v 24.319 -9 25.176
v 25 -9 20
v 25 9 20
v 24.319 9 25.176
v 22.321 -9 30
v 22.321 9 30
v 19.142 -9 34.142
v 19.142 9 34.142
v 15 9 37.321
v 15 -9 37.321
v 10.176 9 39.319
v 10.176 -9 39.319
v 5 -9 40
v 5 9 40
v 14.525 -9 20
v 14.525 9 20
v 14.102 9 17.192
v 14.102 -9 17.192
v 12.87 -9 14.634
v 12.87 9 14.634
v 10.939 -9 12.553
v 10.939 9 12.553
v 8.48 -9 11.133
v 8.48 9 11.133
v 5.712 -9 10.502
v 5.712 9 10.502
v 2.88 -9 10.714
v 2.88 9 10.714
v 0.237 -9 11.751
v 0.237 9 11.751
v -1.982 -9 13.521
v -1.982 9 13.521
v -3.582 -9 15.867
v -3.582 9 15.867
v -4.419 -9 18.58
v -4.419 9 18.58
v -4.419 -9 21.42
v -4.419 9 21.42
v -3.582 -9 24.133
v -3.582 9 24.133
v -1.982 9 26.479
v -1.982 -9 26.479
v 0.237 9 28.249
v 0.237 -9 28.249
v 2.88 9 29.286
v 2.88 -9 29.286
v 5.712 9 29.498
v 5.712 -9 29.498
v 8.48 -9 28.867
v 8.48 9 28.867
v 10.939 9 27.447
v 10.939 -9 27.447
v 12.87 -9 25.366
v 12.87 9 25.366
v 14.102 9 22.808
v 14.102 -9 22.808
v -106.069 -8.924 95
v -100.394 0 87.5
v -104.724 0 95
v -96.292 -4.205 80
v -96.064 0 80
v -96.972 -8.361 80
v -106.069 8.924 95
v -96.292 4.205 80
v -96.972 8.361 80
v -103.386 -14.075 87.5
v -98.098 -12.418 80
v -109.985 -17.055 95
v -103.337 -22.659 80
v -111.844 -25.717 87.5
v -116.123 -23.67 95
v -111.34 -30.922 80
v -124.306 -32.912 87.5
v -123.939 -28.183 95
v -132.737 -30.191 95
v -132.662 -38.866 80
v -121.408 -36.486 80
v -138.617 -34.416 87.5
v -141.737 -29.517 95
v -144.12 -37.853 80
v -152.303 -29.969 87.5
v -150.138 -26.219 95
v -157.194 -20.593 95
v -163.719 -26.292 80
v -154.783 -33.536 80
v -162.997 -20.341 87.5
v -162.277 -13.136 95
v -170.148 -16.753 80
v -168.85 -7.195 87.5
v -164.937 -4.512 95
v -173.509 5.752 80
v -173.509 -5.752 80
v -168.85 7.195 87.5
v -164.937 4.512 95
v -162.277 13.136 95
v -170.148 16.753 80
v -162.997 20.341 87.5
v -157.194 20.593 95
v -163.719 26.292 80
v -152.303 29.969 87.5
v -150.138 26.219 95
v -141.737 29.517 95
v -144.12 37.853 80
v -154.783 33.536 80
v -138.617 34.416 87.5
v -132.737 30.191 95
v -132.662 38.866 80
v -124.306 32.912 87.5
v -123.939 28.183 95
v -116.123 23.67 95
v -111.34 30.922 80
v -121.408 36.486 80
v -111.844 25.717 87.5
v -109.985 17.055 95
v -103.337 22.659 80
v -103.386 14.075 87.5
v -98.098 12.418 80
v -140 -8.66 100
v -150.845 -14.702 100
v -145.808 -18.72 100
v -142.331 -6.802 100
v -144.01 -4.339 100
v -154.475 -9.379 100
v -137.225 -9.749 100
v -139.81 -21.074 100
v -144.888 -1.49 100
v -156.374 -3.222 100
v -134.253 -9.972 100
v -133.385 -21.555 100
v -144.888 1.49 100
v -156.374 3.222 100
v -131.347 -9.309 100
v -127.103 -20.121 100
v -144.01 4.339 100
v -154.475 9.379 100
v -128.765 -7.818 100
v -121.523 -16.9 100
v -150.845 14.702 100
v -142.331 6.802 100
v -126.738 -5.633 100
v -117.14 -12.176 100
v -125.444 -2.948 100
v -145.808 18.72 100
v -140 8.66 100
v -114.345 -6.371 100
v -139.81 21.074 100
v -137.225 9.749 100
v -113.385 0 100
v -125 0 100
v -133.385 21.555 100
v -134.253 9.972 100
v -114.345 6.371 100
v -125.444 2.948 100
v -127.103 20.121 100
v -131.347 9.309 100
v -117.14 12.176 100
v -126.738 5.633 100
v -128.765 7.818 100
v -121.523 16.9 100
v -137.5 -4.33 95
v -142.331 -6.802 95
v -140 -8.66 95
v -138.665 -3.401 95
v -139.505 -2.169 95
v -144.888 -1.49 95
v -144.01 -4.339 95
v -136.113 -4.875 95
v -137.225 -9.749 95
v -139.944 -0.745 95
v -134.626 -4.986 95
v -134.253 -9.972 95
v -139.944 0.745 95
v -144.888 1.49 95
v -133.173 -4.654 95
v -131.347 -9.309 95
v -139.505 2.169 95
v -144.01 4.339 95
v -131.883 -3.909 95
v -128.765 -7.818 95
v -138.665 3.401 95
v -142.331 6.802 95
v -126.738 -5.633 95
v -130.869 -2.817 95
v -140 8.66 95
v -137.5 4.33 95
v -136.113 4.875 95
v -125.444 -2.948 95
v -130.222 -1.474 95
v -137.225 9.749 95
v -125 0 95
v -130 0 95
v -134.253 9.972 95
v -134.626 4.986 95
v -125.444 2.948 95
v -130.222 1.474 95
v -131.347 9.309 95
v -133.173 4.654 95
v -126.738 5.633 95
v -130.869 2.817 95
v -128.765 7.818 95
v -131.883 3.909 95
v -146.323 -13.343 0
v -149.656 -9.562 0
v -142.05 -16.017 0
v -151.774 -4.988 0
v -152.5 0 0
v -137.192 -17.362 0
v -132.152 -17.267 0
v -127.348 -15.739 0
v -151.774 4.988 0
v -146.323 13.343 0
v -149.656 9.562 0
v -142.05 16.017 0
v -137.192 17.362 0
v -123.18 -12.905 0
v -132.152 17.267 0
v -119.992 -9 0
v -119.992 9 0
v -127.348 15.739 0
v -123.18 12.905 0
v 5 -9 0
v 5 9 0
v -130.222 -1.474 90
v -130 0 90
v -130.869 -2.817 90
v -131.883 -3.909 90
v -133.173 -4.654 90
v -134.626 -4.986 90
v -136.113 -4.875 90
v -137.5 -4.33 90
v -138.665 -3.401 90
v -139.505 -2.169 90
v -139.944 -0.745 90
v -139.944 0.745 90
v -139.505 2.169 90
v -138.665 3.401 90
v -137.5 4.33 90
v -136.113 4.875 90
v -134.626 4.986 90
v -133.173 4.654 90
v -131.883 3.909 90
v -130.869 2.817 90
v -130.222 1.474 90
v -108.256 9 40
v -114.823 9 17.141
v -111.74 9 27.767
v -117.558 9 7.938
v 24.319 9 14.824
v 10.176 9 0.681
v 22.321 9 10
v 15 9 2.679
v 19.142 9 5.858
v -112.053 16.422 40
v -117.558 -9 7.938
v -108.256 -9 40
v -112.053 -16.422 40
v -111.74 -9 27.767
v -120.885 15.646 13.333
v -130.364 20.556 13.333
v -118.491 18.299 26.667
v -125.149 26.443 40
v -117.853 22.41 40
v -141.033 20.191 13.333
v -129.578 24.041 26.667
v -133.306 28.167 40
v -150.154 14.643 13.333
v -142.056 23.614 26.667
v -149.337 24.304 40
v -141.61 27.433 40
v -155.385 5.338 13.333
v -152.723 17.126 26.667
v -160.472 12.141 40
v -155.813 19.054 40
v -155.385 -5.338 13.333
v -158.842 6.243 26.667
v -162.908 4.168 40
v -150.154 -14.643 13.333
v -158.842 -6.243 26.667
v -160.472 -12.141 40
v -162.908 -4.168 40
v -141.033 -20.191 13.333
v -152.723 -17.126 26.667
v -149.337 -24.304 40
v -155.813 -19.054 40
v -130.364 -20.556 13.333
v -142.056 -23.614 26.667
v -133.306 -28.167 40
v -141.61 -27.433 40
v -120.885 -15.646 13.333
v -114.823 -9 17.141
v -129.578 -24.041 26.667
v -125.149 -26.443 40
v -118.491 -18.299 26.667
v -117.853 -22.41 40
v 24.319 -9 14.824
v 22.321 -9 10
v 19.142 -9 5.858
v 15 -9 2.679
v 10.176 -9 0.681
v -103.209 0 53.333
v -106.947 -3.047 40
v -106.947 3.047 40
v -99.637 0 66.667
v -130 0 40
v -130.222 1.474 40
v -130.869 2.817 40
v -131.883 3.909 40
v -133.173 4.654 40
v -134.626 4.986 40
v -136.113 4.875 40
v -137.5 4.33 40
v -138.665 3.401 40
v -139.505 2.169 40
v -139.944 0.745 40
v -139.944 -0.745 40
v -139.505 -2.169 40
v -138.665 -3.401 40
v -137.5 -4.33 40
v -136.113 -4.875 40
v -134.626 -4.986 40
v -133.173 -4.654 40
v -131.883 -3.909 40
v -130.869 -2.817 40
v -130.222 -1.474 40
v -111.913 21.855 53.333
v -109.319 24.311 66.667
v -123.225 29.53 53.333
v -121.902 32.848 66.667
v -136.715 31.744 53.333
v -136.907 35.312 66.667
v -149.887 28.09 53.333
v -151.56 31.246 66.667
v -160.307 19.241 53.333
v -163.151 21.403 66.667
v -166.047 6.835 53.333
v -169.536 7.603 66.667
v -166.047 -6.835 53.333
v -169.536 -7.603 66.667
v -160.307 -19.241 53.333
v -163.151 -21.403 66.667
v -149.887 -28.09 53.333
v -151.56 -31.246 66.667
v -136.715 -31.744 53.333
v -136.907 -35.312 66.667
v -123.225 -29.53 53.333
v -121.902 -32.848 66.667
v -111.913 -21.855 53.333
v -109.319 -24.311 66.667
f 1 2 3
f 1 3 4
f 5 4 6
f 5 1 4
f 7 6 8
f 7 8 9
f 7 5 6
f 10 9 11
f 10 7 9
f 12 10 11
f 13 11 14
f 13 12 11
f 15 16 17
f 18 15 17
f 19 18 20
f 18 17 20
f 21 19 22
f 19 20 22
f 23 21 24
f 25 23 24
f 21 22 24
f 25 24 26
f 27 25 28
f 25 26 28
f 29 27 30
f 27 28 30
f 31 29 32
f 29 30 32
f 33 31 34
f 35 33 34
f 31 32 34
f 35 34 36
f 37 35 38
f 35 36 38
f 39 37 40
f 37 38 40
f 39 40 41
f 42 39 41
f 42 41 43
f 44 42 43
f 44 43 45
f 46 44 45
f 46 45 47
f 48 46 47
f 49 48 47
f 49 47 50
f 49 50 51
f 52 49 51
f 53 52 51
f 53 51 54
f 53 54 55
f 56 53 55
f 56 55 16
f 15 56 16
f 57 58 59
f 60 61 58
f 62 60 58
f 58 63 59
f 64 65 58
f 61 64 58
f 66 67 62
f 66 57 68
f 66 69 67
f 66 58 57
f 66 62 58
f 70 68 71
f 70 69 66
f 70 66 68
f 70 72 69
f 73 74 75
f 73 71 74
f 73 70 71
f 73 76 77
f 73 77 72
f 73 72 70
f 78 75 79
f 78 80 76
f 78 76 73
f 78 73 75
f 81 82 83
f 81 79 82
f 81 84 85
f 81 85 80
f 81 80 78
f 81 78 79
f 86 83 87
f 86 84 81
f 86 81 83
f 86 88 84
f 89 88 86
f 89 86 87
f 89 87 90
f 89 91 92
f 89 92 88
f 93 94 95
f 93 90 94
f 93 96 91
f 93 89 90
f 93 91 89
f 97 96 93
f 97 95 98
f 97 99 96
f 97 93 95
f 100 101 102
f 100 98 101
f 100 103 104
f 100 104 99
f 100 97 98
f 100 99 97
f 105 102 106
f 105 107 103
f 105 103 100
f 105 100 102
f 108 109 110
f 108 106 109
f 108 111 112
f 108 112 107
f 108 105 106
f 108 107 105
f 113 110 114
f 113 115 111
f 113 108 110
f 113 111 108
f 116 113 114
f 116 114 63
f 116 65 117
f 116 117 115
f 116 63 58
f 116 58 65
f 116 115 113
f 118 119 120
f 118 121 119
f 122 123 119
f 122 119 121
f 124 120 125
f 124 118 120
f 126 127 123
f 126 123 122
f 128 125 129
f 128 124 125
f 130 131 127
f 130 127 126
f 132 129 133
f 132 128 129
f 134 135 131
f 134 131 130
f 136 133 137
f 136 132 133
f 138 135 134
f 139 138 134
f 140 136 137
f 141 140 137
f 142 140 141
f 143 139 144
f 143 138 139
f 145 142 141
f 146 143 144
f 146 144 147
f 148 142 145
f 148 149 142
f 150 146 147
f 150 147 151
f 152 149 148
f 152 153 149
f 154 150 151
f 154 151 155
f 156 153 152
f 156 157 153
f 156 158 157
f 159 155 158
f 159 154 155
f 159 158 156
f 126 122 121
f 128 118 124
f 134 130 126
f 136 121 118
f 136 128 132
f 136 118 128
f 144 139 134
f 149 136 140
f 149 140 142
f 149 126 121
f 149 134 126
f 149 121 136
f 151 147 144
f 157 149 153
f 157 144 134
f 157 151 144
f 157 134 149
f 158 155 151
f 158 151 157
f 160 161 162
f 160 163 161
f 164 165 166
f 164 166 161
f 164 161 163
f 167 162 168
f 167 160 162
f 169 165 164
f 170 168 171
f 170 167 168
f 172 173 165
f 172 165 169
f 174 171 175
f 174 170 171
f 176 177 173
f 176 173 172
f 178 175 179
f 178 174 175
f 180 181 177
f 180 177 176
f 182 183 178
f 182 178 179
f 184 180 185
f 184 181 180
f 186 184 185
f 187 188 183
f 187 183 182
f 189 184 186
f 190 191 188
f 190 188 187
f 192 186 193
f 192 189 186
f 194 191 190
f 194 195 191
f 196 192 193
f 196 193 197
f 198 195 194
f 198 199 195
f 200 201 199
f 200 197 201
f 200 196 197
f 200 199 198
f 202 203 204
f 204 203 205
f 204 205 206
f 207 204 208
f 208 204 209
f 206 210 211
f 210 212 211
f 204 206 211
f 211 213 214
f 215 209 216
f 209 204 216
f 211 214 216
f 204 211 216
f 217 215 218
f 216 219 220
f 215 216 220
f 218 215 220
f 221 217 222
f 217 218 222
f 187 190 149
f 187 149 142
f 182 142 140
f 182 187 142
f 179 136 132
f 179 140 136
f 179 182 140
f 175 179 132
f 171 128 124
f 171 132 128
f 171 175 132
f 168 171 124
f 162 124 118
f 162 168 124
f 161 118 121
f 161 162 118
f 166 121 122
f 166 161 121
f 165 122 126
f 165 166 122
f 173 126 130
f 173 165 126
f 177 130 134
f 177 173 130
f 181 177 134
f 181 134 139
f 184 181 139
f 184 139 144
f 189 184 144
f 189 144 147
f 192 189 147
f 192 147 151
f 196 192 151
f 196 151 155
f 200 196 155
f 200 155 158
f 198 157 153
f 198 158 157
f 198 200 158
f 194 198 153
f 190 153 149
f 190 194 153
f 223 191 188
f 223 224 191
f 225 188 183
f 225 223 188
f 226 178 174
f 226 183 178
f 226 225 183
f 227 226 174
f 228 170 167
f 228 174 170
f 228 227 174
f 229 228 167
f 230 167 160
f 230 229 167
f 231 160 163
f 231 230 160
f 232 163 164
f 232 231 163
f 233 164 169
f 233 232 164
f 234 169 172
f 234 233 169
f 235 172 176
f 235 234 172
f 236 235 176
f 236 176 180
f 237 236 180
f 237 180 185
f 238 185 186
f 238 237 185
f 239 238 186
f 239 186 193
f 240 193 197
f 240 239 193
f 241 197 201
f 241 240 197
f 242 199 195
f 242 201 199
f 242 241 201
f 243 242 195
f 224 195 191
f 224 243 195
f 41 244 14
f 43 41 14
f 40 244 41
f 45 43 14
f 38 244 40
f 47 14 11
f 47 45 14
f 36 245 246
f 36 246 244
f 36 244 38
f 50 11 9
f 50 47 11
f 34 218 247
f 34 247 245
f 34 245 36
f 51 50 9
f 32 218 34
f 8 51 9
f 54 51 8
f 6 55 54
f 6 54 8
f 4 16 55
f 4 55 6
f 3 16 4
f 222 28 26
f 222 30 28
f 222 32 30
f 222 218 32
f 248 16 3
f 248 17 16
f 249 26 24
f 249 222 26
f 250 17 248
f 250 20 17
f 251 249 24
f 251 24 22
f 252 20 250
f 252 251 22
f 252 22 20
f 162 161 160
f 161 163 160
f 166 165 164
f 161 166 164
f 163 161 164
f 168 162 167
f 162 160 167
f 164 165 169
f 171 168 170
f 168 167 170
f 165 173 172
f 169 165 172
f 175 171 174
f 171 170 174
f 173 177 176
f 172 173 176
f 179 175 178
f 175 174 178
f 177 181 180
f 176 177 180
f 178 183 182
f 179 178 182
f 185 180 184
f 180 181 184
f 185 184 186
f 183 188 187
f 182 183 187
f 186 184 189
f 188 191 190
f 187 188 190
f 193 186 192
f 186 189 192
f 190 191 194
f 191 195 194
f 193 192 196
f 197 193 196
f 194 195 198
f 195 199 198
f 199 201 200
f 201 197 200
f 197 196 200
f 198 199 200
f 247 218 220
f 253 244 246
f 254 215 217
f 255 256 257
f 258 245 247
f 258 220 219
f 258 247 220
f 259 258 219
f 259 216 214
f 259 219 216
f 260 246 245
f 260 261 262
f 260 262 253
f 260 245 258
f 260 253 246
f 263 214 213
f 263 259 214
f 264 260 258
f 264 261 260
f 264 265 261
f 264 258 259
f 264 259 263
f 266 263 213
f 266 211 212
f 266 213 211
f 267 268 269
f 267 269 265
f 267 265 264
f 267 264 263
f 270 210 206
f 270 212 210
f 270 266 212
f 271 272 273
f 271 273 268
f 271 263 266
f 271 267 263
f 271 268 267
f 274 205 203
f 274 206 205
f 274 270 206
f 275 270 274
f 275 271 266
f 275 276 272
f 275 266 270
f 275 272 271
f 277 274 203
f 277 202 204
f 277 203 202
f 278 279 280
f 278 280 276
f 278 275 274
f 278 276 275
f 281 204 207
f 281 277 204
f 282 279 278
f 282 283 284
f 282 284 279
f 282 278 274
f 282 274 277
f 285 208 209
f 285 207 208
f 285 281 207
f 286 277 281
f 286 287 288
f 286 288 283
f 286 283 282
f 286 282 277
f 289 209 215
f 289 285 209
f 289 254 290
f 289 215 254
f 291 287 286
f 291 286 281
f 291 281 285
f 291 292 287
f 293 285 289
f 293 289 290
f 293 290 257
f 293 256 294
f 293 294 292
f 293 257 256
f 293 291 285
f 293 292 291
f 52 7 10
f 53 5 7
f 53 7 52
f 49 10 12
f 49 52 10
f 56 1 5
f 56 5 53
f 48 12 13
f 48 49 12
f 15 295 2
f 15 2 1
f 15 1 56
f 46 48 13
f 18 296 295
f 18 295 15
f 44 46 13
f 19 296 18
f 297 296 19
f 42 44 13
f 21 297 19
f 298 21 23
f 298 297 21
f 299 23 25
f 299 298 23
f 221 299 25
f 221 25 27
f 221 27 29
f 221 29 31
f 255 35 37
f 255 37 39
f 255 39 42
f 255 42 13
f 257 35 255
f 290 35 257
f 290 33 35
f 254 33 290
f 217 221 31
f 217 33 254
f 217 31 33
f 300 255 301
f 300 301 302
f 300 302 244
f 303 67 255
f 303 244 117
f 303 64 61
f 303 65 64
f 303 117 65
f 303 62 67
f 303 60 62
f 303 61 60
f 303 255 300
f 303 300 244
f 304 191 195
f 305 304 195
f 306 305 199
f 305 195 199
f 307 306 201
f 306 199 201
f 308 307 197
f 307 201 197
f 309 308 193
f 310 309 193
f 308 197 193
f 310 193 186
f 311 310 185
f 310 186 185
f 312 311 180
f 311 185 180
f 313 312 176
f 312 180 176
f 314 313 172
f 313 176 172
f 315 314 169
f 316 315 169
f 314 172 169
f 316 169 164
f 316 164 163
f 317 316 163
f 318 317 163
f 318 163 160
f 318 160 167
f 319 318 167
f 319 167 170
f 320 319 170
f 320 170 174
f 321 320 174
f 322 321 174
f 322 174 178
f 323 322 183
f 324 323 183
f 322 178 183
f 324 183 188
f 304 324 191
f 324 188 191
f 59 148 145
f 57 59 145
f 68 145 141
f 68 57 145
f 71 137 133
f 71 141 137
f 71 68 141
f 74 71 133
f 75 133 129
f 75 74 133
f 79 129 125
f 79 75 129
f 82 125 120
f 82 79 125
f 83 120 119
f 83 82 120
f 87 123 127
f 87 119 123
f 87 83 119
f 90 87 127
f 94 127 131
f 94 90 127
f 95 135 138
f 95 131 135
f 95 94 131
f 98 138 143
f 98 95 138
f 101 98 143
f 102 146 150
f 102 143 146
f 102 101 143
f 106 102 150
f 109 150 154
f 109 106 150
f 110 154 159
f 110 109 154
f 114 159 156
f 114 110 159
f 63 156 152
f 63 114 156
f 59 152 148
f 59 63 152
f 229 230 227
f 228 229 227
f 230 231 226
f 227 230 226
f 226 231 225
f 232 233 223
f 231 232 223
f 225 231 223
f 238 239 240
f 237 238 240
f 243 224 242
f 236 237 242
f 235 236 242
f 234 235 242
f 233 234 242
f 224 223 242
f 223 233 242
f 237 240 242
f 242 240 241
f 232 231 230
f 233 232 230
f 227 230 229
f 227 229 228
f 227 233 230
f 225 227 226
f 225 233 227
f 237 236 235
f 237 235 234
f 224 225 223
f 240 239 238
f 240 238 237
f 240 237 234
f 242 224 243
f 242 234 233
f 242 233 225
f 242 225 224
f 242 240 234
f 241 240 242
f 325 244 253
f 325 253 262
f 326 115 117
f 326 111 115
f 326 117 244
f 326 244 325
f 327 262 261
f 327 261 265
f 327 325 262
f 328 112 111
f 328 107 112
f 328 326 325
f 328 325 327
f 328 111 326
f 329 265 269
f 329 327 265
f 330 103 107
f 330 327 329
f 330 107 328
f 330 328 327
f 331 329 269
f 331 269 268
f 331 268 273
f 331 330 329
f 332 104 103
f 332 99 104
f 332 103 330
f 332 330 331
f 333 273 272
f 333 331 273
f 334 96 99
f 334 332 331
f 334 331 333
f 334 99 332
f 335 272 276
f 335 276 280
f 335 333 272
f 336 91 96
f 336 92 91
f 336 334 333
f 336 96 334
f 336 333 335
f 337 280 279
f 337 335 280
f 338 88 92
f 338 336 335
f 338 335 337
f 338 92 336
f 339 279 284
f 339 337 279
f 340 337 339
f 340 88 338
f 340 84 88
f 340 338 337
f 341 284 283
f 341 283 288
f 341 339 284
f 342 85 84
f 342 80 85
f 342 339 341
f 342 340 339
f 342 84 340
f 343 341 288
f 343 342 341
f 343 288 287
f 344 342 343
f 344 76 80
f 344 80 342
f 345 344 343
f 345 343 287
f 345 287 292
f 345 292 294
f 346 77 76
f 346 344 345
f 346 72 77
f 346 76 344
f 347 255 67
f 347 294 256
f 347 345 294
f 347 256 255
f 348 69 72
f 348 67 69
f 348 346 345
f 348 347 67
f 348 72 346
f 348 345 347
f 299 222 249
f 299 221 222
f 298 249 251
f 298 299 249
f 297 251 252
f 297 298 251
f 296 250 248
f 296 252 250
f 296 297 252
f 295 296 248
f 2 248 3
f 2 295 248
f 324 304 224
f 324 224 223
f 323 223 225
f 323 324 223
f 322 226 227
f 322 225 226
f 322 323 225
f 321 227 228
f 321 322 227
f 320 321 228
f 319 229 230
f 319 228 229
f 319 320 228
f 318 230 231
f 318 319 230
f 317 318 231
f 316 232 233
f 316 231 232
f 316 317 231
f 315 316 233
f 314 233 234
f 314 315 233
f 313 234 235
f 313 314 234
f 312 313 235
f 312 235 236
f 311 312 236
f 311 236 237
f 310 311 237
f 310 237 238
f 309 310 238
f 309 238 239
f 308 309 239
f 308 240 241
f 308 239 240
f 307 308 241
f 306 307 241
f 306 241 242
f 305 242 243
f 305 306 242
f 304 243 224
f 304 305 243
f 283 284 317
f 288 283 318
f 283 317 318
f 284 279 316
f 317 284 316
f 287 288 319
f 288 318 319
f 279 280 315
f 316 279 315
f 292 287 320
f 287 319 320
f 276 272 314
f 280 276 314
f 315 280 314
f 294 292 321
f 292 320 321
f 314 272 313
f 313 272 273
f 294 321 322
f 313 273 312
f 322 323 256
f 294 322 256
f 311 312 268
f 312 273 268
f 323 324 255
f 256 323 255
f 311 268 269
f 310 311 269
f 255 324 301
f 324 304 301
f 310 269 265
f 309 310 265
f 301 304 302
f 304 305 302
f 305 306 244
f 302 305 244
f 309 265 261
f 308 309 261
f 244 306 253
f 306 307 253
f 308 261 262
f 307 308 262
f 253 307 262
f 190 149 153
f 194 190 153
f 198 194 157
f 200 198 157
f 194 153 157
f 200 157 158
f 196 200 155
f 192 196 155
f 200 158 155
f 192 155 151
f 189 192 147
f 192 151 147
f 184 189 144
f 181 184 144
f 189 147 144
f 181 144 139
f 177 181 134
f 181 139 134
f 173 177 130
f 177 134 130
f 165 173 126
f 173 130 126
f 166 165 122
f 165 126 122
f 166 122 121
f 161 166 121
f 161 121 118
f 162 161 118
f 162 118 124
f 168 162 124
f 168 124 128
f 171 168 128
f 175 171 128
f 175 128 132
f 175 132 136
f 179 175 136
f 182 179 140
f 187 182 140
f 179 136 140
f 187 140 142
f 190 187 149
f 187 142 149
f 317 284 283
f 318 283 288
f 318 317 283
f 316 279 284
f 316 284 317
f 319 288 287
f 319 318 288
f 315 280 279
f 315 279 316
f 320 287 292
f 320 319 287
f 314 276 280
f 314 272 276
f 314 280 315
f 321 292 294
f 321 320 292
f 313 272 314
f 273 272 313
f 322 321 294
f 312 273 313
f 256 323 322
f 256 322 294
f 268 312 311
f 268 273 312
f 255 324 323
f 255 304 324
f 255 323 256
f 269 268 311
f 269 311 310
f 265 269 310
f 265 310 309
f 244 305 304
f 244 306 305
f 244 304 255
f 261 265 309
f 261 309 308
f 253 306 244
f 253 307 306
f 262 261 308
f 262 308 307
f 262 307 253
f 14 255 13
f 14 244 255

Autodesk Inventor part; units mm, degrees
ref_plane "YZ Plane" through (0, 0, 0) normal (1, 0, 0) x (0, 1, 0)
ref_plane "XZ Plane" through (0, 0, 0) normal (0, 1, 0) x (-1, 0, 0)
ref_plane "XY Plane" through (0, 0, 0) normal (0, 0, 1) x (1, 0, 0)
sketch "Sketch1" plane through (0, 0, 0) normal (0, 0, 1) x (1, 0, 0)
  line L0 (25, -9) -> (-135, -9)
  line L1 (-135, -9) -> (-135, 9)
  line L2 (-135, 9) -> (25, 9)
  line L3 (25, 9) -> (25, -9)
  circle A0 centre (-135, 0) radius 17.5
  point P0 (0, 0)
  dimension "d0" = 160
  dimension "d1" = 18
  dimension "d5" = 35
extrude "Extrusion1" add sketch "Sketch1" along normal blind 40 contours L0 A0 L2 L3 | L0 L1 L2 A0 picked at (-129.1667, 0)
fillet "Fillet1" radius 20 2 edges at (25, 0, 40) (25, 0, 0)
extrude "Extrusion2" add sketch "Sketch1" along normal blind 40 draft 15 contours A0 L2 L1 L0 | L0 L1 L2 A0
sketch "Sketch4" plane through (0, 0, 40) normal (0, 0, 1) x (1, 0, 0)
  line L0 (-108.2558, -9) -> (5, -9) projected
  line L1 (5, 9) -> (5, -9) projected
  line L2 (5, 9) -> (-108.2558, 9) projected
  arc A0 (-108.2558, 9) -> (-108.2558, -9) centre (-135, 0) ccw projected
  circle A1 centre (-135, 0) radius 28.218
  point P0 (0, 0)
extrude "Extrusion3" add sketch "Sketch4" along normal blind 40 draft 15 separate body contours A0 A1
sketch "Sketch5" plane through (-135, 0, 80) normal (0, 0, 1) x (1, 0, 0)
  circle A0 centre (0, 0) radius 38.9359 projected
  point P0 (135, 0)
extrude "Extrusion4" add sketch "Sketch5" along normal blind 15 draft -30 bodies 2
sketch "Sketch6" plane through (-135, 0, 95) normal (0, 0, 1) x (1, 0, 0)
  circle A0 centre (0, 0) radius 30.2757 projected
  point P0 (135, 0)
extrude "Extrusion5" add sketch "Sketch6" along normal blind 5 draft -60 bodies 2
sketch "Sketch9" plane through (5, 9, 20) normal (0, 1, 0) x (1, 0, 0)
  circle A0 centre (0, 0) radius 9.525
  point P0 (-5, 20)
  dimension "d21" = 19.05
extrude "Extrusion8" cut sketch "Sketch9" against normal through all bodies 1
sketch "Sketch11" plane through (0, 0, 40) normal (0, 0, 1) x (1, 0, 0)
  arc A0 (-108.2558, 9) -> (-108.2558, -9) centre (-135, 0) ccw projected
  circle A1 centre (-135, 0) radius 5
  point P0 (0, 0)
  dimension "d27" = 10
extrude "Extrusion10" add sketch "Sketch11" along normal blind 50 bodies 1
sketch "Sketch13" plane through (-135, 0, 95) normal (0, 0, 1) x (1, 0, 0)
  circle A0 centre (0, 0) radius 5 projected
  point P0 (135, 0)
extrude "Extrusion12" cut sketch "Sketch13" against normal through all bodies 2
sketch "Sketch14" plane through (-135, 0, 100) normal (0, 0, 1) x (1, 0, 0)
  circle A0 centre (0, 0) radius 10
  point P0 (135, 0)
  dimension "d34" = 20
extrude "Extrusion13" cut sketch "Sketch14" against normal blind 5 bodies 2
sketch "Sketch15" plane through (-135, 0, 90) normal (0, 0, 1) x (1, 0, 0)
  circle A0 centre (0, 0) radius 5 projected
extrude "Extrusion14" add sketch "Sketch15" along normal blind 5 separate body
sketch "Sketch16" plane through (-135, 0, 95) normal (0, 0, 1) x (1, 0, 0)
  circle A0 centre (0, 0) radius 10 projected
  point P0 (135, 0)
extrude "Extrusion15" add sketch "Sketch16" along normal blind 5 bodies 3
properties part number "handle"
